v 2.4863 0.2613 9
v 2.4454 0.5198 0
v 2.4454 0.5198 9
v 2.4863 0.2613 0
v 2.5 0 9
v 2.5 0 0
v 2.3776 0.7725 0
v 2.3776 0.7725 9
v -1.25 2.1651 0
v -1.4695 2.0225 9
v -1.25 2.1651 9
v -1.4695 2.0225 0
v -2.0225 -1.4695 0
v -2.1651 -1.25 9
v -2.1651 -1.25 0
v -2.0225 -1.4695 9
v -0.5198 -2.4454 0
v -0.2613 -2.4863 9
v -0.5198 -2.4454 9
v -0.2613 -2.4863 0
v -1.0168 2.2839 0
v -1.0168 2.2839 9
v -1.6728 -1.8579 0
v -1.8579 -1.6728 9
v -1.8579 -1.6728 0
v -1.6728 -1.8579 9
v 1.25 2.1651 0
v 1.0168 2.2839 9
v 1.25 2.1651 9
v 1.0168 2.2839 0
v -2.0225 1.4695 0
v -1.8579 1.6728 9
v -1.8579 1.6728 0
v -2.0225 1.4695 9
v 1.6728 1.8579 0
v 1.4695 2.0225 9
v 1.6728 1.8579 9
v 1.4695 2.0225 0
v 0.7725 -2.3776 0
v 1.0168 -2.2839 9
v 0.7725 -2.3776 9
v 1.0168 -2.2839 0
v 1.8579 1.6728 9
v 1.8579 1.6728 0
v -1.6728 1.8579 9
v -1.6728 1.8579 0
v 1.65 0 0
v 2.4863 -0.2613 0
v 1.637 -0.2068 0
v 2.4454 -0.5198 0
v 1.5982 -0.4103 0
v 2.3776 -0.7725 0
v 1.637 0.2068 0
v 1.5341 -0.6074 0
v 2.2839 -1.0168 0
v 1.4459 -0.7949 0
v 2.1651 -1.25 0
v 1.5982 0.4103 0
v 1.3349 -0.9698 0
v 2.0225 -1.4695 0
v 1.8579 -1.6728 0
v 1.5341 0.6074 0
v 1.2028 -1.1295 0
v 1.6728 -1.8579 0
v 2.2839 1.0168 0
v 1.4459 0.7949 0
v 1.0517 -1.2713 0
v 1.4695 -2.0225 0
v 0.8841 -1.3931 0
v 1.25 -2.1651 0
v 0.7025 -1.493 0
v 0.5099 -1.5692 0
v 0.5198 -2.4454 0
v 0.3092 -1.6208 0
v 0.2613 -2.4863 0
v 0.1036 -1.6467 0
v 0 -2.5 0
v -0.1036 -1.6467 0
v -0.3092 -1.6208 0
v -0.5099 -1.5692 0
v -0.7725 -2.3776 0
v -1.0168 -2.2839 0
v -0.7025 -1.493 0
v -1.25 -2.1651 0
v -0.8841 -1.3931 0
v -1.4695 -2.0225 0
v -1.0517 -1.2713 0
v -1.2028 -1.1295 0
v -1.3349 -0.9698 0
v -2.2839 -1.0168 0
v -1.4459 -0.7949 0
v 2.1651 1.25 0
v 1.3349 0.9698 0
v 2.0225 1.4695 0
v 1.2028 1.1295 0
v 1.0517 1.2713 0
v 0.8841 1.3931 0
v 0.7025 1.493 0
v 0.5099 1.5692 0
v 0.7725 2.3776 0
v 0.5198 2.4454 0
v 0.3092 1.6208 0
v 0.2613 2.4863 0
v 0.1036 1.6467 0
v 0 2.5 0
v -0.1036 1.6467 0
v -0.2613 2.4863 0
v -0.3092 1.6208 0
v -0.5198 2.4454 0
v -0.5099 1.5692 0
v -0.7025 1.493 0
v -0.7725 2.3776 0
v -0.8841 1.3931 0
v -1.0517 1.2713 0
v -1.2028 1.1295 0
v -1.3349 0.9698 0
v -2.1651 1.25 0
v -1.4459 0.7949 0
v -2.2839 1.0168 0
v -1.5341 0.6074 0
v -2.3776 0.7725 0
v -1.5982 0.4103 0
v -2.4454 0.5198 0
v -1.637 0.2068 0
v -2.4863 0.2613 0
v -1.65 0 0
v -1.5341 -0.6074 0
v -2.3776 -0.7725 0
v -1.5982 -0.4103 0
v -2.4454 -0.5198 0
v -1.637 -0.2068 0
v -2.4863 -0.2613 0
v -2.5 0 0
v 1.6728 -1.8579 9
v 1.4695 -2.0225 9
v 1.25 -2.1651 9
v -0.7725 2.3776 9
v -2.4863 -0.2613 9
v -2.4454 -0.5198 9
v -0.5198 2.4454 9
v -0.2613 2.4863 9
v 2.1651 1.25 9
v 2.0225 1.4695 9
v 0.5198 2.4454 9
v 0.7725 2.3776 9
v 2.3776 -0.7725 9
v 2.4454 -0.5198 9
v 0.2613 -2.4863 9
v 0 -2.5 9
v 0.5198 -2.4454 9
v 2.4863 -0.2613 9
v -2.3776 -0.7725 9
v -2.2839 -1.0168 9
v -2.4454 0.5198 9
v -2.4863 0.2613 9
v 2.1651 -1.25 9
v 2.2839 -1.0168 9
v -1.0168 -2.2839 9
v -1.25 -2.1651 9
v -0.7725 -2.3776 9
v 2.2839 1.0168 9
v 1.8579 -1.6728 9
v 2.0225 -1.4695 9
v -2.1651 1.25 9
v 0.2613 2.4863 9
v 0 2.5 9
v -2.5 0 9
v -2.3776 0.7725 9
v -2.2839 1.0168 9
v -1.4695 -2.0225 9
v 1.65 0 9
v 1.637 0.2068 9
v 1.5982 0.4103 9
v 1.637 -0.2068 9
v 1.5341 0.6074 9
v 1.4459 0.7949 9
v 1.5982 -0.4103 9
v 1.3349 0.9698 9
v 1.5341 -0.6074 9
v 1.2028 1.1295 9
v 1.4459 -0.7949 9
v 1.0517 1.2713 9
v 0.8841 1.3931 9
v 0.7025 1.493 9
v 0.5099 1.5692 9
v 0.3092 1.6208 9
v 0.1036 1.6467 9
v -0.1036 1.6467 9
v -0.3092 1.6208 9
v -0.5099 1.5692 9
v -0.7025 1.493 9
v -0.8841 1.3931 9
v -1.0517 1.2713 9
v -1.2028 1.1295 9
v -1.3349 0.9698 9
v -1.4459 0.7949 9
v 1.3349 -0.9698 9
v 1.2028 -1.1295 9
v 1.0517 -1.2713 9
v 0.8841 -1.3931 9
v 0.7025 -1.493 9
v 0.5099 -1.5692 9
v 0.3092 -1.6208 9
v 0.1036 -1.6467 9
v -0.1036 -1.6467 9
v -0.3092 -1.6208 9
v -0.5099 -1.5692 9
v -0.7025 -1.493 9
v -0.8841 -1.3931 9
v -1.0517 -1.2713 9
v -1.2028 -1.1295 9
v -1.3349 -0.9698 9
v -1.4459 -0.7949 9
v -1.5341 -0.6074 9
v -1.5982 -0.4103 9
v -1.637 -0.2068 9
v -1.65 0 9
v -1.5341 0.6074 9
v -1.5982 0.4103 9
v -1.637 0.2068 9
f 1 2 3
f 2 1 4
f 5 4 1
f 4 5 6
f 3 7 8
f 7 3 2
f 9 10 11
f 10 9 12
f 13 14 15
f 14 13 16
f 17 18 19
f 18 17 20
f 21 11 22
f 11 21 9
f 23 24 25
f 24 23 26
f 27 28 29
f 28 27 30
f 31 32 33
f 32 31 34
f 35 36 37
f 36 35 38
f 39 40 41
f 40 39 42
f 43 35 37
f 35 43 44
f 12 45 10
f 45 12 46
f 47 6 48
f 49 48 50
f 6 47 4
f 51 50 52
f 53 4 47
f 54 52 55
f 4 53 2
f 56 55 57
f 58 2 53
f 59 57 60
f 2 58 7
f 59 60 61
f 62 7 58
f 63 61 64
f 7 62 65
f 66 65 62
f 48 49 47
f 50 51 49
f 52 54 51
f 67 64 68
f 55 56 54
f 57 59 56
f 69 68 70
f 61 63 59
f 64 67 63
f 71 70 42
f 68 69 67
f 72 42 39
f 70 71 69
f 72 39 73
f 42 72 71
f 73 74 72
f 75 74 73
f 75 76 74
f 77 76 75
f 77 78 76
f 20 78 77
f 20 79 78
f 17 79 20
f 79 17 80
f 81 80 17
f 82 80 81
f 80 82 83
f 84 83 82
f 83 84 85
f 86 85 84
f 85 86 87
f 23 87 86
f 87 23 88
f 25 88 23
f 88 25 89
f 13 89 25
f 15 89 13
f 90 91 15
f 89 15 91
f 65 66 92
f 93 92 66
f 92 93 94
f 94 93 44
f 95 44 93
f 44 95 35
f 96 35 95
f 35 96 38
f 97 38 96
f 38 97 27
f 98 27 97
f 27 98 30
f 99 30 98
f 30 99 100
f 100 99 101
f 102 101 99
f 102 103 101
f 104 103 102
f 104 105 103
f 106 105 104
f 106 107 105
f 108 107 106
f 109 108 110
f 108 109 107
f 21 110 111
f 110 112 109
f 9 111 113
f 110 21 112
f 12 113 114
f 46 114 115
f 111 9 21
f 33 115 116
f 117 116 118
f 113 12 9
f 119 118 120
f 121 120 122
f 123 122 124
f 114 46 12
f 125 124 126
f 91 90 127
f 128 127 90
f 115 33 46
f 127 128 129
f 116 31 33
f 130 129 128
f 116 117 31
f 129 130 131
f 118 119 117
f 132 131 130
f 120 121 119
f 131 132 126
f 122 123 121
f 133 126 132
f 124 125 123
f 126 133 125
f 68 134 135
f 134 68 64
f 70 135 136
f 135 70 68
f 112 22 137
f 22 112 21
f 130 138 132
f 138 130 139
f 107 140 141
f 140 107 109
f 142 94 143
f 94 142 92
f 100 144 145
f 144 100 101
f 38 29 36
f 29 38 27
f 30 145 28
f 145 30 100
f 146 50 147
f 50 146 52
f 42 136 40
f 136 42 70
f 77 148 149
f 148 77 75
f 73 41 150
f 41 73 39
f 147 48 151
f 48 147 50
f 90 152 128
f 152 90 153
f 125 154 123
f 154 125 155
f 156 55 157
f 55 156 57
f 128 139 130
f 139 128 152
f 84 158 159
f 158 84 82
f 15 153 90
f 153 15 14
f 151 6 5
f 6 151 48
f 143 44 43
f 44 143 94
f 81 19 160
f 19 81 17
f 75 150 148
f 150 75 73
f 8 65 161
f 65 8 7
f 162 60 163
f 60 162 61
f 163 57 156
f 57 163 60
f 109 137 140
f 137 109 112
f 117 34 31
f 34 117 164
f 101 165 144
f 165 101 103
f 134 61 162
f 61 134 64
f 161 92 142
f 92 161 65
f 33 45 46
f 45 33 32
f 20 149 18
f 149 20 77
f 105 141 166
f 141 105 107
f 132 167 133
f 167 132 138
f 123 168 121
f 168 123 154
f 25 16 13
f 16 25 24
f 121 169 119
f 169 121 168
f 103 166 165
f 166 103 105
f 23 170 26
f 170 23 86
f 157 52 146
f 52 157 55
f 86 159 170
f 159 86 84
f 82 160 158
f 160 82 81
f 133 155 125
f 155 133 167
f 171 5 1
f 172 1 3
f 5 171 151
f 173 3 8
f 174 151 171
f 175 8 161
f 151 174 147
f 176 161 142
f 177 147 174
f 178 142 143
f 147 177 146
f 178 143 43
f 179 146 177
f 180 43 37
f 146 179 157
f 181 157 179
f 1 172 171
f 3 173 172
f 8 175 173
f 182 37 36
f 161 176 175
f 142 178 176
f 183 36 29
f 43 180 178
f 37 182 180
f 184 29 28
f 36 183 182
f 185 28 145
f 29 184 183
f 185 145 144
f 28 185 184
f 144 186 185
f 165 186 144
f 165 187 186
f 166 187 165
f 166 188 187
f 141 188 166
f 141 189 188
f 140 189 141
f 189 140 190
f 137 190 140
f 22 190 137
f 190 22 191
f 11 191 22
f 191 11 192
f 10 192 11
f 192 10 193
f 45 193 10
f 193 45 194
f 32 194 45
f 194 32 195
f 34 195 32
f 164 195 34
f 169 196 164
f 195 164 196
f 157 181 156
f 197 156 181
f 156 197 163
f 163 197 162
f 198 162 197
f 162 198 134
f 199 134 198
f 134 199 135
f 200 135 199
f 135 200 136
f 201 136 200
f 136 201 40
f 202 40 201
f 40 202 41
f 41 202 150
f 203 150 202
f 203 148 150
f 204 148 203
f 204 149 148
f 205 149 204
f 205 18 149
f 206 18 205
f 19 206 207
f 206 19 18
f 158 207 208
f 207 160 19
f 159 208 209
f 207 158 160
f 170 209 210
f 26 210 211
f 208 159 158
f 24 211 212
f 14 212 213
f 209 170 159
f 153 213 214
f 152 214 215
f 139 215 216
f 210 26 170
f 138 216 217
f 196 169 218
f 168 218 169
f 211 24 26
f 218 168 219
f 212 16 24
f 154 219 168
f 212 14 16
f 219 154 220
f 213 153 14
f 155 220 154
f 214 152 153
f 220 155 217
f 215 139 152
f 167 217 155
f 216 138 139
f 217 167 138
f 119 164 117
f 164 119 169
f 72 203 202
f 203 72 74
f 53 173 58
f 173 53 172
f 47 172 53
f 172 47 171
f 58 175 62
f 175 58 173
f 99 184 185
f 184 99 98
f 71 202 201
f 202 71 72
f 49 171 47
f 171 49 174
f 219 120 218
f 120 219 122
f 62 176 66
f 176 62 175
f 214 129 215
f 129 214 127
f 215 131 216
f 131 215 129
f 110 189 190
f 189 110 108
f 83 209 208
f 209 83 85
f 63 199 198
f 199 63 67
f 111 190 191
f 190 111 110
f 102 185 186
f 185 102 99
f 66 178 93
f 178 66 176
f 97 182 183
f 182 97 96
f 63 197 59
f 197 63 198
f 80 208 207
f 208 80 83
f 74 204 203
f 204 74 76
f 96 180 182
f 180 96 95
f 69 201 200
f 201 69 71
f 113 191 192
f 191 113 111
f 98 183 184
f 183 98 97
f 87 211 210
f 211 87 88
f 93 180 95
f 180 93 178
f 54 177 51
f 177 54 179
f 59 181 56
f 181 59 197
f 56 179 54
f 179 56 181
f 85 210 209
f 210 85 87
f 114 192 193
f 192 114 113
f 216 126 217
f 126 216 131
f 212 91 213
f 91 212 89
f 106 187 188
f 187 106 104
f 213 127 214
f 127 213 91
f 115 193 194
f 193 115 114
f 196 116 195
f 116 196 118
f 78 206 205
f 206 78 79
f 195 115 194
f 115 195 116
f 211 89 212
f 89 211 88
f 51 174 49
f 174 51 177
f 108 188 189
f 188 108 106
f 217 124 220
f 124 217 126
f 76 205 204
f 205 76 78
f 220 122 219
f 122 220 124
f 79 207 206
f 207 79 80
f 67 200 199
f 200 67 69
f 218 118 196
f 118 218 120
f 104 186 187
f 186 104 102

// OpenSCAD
// Copyright (C) 2022  Bhavin Gandhi
//
// This program is free software: you can redistribute it and/or modify
// it under the terms of the GNU General Public License as published by
// the Free Software Foundation, either version 3 of the License, or
// (at your option) any later version.
//
// This program is distributed in the hope that it will be useful,
// but WITHOUT ANY WARRANTY; without even the implied warranty of
// MERCHANTABILITY or FITNESS FOR A PARTICULAR PURPOSE.  See the
// GNU General Public License for more details.
//
// You should have received a copy of the GNU General Public License
// along with this program.  If not, see <https://www.gnu.org/licenses/>.

module hole_pad(height, radius) {
    difference()
    {
        cylinder(h = height, r = radius, $fn = 60);

        // M3 bolt hole
        translate(v = [0, 0, -1]) cylinder(h = height+2, r = 1.65, $fn = 50);
    }
}

// For 606-2RS bearing
// Bearing width is actually 6mm but we are using
// it at places where we have space of 9.4+mm
// hole_pad(8.5, 3);

// For GT2 20 teeth idler pulley
hole_pad(9, 2.5);
